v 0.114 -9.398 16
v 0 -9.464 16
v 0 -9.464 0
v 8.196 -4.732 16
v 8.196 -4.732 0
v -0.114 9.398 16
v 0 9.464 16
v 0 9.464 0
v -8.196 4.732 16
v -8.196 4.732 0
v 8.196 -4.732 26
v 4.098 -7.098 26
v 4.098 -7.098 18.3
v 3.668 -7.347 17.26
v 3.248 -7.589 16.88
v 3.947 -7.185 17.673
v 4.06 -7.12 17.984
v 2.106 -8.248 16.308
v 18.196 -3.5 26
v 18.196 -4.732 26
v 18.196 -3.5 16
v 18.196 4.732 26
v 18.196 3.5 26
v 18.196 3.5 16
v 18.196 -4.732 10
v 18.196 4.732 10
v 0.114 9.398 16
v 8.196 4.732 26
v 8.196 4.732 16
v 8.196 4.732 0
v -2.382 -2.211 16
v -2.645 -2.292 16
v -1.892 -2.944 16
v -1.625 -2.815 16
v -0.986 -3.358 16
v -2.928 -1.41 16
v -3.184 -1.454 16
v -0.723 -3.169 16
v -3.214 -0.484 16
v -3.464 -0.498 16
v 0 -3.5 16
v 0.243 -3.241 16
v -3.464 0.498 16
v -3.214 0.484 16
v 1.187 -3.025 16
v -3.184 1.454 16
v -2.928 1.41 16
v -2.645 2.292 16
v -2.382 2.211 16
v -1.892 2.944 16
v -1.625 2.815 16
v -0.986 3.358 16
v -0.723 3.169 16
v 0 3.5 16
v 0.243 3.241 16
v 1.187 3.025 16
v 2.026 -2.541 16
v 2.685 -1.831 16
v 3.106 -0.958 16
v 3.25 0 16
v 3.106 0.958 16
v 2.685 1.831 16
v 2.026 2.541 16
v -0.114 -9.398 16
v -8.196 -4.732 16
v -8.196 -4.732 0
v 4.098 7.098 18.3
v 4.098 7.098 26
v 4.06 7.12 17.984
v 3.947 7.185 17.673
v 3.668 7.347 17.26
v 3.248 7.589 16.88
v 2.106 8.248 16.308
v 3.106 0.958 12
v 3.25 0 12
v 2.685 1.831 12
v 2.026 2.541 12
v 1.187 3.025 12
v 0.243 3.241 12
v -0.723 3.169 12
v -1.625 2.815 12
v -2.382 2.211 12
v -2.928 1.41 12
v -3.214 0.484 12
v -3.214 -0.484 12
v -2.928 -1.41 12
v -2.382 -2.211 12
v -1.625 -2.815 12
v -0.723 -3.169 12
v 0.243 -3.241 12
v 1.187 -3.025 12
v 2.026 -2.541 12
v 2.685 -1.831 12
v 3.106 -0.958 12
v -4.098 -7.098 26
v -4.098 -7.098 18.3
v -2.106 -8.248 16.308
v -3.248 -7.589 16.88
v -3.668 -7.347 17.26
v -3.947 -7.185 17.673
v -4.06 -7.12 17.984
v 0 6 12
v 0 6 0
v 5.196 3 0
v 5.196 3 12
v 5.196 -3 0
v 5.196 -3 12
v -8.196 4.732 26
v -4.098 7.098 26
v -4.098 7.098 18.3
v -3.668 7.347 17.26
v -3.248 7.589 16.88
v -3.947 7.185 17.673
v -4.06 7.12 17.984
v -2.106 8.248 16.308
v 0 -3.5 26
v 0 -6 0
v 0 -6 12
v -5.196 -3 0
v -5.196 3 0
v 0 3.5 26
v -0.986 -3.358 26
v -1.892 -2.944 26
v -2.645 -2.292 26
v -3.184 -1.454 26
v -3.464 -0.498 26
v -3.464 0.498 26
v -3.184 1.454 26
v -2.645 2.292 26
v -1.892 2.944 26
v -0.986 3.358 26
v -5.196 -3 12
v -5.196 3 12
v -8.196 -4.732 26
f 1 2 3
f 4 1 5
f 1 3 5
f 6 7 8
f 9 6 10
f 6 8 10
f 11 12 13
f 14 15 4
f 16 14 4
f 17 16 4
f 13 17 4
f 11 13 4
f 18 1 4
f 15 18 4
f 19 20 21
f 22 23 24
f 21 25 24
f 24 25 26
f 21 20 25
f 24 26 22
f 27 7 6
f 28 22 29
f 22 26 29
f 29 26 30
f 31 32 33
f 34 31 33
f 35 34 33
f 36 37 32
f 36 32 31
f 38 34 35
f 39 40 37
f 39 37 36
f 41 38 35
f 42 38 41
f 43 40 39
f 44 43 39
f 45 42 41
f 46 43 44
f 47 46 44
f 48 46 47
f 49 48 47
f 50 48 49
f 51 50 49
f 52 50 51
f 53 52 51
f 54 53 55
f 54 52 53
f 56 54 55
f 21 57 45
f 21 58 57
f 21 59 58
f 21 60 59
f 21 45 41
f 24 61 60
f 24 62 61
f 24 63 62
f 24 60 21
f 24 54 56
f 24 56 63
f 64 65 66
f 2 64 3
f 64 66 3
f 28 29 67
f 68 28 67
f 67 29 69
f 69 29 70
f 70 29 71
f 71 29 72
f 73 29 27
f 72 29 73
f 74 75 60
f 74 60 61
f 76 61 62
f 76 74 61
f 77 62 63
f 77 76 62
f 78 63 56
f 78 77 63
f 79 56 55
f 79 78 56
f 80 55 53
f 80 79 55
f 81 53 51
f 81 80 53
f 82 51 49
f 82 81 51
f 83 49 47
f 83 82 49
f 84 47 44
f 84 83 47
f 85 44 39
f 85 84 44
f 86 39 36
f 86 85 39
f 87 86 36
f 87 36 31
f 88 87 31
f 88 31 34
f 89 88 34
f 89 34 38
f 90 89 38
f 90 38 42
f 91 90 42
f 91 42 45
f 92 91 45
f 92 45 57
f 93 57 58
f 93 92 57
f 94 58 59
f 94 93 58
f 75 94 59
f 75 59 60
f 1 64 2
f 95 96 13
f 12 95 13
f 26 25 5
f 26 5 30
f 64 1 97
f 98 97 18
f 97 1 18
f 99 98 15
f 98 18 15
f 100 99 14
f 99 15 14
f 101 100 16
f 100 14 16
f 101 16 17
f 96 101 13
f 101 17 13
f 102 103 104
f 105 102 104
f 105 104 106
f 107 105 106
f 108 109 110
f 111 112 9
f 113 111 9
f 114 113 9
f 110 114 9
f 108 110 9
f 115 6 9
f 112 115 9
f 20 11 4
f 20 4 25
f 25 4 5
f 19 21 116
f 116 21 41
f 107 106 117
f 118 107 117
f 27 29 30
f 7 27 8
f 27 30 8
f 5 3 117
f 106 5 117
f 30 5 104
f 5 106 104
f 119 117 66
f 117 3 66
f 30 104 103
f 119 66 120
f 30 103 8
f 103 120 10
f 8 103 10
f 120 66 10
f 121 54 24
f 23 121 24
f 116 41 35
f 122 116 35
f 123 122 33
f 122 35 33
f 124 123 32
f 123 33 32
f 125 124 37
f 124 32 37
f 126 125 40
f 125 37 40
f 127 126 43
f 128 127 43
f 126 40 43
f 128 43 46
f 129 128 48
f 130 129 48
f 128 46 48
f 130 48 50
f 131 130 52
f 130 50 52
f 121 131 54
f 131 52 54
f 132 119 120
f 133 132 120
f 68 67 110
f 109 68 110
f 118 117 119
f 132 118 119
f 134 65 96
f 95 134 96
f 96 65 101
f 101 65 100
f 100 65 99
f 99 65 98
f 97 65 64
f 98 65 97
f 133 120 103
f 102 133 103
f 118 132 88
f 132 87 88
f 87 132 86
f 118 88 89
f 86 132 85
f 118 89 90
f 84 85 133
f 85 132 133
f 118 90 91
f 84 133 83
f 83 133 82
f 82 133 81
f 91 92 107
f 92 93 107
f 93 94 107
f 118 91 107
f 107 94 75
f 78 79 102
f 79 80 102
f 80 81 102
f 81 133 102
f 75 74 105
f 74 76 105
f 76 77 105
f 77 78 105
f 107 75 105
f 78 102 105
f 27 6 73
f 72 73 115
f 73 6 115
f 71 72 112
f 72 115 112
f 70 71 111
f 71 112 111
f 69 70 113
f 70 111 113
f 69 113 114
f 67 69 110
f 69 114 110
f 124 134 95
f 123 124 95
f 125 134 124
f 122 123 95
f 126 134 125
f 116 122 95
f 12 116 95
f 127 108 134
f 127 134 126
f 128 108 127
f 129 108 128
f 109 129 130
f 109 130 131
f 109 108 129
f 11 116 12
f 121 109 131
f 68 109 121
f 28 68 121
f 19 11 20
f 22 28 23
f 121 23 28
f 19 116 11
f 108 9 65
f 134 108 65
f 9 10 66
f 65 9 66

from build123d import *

# Parameters (mm, degrees)
F1_DEPTH = 12
F2_DEPTH = 10
F3_SIZE  = 10
F4_R     = 3.25
F5_DEPTH = 4
F7_DEPTH = 10
F8_R     = 2.3


with BuildPart() as f1:
    # F0 (on Top) → F1 (new body)
    with BuildSketch(Plane.XY):
        Polygon((-8.1961524227, 4.7320508076), (-8.1961524227, -4.7320508076), (0, -9.4641016151), (8.1961524227, -4.7320508076), (8.1961524227, 4.7320508076), (0, 9.4641016151), align=None)
        Polygon((-5.1961524227, 3), (0, 6), (5.1961524227, 3), (5.1961524227, -3), (0, -6), (-5.1961524227, -3), align=None, mode=Mode.SUBTRACT)
    extrude(amount=F1_DEPTH)

    # F2 (add): a face of the model
    f2_faces = [f1.faces().sort_by_distance(p)[0] for p in [
        (8.1961524227, 0, 6),
    ]]
    extrude(f2_faces, amount=F2_DEPTH)

    # F3
    f3_edges = [f1.edges().sort_by_distance(p)[0] for p in [
        (18.196152, 0, 0),
    ]]
    chamfer(f3_edges, length=F3_SIZE)

    # F4 (on face) → F5 (join)
    with BuildSketch(Plane.XY.offset(12)):
        Polygon((0, 9.4641016151), (-8.1961524227, 4.7320508076), (-8.1961524227, -4.7320508076), (0, -9.4641016151), (8.1961524227, -4.7320508076), (18.1961524227, -4.7320508076), (18.1961524227, 4.7320508076), (8.1961524227, 4.7320508076), align=None)
        Polygon((-5.1961524227, -3), (-5.1961524227, 3), (0, 6), (5.1961524227, 3), (5.1961524227, -3), (0, -6), align=None, mode=Mode.SUBTRACT)
        Polygon((0, 6), (-5.1961524227, 3), (-5.1961524227, -3), (0, -6), (5.1961524227, -3), (5.1961524227, 3), align=None)
        Circle(F4_R, mode=Mode.SUBTRACT)
    extrude(amount=F5_DEPTH)

    # F6 (on face) → F7 (join)
    with BuildSketch(Plane.XY.offset(16)):
        with BuildLine():
            ThreePointArc((0, -3.5), (-3.5, 0), (0, 3.5))
            Line((0, 3.5), (18.1961524227, 3.5))
            Line((18.1961524227, 3.5), (18.1961524227, 4.7320508076))
            Line((18.1961524227, 4.7320508076), (8.1961524227, 4.7320508076))
            Line((8.1961524227, 4.7320508076), (4.0980762114, 7.0980762114))
            Line((4.0980762114, 7.0980762114), (-4.0980762114, 7.0980762114))
            Line((-4.0980762114, 7.0980762114), (-8.1961524227, 4.7320508076))
            Line((-8.1961524227, 4.7320508076), (-8.1961524227, -4.7320508076))
            Line((-8.1961524227, -4.7320508076), (-4.0980762114, -7.0980762114))
            Line((-4.0980762114, -7.0980762114), (4.0980762114, -7.0980762114))
            Line((4.0980762114, -7.0980762114), (8.1961524227, -4.7320508076))
            Line((8.1961524227, -4.7320508076), (18.1961524227, -4.7320508076))
            Line((18.1961524227, -4.7320508076), (18.1961524227, -3.5))
            Line((18.1961524227, -3.5), (0, -3.5))
        make_face()
    extrude(amount=F7_DEPTH)

    # F8
    f8_edges = [f1.edges().sort_by_distance(p)[0] for p in [
        (0, -7.098076, 16),
        (0, 7.098076, 16),
    ]]
    fillet(f8_edges, radius=F8_R)


solid = f1.part
